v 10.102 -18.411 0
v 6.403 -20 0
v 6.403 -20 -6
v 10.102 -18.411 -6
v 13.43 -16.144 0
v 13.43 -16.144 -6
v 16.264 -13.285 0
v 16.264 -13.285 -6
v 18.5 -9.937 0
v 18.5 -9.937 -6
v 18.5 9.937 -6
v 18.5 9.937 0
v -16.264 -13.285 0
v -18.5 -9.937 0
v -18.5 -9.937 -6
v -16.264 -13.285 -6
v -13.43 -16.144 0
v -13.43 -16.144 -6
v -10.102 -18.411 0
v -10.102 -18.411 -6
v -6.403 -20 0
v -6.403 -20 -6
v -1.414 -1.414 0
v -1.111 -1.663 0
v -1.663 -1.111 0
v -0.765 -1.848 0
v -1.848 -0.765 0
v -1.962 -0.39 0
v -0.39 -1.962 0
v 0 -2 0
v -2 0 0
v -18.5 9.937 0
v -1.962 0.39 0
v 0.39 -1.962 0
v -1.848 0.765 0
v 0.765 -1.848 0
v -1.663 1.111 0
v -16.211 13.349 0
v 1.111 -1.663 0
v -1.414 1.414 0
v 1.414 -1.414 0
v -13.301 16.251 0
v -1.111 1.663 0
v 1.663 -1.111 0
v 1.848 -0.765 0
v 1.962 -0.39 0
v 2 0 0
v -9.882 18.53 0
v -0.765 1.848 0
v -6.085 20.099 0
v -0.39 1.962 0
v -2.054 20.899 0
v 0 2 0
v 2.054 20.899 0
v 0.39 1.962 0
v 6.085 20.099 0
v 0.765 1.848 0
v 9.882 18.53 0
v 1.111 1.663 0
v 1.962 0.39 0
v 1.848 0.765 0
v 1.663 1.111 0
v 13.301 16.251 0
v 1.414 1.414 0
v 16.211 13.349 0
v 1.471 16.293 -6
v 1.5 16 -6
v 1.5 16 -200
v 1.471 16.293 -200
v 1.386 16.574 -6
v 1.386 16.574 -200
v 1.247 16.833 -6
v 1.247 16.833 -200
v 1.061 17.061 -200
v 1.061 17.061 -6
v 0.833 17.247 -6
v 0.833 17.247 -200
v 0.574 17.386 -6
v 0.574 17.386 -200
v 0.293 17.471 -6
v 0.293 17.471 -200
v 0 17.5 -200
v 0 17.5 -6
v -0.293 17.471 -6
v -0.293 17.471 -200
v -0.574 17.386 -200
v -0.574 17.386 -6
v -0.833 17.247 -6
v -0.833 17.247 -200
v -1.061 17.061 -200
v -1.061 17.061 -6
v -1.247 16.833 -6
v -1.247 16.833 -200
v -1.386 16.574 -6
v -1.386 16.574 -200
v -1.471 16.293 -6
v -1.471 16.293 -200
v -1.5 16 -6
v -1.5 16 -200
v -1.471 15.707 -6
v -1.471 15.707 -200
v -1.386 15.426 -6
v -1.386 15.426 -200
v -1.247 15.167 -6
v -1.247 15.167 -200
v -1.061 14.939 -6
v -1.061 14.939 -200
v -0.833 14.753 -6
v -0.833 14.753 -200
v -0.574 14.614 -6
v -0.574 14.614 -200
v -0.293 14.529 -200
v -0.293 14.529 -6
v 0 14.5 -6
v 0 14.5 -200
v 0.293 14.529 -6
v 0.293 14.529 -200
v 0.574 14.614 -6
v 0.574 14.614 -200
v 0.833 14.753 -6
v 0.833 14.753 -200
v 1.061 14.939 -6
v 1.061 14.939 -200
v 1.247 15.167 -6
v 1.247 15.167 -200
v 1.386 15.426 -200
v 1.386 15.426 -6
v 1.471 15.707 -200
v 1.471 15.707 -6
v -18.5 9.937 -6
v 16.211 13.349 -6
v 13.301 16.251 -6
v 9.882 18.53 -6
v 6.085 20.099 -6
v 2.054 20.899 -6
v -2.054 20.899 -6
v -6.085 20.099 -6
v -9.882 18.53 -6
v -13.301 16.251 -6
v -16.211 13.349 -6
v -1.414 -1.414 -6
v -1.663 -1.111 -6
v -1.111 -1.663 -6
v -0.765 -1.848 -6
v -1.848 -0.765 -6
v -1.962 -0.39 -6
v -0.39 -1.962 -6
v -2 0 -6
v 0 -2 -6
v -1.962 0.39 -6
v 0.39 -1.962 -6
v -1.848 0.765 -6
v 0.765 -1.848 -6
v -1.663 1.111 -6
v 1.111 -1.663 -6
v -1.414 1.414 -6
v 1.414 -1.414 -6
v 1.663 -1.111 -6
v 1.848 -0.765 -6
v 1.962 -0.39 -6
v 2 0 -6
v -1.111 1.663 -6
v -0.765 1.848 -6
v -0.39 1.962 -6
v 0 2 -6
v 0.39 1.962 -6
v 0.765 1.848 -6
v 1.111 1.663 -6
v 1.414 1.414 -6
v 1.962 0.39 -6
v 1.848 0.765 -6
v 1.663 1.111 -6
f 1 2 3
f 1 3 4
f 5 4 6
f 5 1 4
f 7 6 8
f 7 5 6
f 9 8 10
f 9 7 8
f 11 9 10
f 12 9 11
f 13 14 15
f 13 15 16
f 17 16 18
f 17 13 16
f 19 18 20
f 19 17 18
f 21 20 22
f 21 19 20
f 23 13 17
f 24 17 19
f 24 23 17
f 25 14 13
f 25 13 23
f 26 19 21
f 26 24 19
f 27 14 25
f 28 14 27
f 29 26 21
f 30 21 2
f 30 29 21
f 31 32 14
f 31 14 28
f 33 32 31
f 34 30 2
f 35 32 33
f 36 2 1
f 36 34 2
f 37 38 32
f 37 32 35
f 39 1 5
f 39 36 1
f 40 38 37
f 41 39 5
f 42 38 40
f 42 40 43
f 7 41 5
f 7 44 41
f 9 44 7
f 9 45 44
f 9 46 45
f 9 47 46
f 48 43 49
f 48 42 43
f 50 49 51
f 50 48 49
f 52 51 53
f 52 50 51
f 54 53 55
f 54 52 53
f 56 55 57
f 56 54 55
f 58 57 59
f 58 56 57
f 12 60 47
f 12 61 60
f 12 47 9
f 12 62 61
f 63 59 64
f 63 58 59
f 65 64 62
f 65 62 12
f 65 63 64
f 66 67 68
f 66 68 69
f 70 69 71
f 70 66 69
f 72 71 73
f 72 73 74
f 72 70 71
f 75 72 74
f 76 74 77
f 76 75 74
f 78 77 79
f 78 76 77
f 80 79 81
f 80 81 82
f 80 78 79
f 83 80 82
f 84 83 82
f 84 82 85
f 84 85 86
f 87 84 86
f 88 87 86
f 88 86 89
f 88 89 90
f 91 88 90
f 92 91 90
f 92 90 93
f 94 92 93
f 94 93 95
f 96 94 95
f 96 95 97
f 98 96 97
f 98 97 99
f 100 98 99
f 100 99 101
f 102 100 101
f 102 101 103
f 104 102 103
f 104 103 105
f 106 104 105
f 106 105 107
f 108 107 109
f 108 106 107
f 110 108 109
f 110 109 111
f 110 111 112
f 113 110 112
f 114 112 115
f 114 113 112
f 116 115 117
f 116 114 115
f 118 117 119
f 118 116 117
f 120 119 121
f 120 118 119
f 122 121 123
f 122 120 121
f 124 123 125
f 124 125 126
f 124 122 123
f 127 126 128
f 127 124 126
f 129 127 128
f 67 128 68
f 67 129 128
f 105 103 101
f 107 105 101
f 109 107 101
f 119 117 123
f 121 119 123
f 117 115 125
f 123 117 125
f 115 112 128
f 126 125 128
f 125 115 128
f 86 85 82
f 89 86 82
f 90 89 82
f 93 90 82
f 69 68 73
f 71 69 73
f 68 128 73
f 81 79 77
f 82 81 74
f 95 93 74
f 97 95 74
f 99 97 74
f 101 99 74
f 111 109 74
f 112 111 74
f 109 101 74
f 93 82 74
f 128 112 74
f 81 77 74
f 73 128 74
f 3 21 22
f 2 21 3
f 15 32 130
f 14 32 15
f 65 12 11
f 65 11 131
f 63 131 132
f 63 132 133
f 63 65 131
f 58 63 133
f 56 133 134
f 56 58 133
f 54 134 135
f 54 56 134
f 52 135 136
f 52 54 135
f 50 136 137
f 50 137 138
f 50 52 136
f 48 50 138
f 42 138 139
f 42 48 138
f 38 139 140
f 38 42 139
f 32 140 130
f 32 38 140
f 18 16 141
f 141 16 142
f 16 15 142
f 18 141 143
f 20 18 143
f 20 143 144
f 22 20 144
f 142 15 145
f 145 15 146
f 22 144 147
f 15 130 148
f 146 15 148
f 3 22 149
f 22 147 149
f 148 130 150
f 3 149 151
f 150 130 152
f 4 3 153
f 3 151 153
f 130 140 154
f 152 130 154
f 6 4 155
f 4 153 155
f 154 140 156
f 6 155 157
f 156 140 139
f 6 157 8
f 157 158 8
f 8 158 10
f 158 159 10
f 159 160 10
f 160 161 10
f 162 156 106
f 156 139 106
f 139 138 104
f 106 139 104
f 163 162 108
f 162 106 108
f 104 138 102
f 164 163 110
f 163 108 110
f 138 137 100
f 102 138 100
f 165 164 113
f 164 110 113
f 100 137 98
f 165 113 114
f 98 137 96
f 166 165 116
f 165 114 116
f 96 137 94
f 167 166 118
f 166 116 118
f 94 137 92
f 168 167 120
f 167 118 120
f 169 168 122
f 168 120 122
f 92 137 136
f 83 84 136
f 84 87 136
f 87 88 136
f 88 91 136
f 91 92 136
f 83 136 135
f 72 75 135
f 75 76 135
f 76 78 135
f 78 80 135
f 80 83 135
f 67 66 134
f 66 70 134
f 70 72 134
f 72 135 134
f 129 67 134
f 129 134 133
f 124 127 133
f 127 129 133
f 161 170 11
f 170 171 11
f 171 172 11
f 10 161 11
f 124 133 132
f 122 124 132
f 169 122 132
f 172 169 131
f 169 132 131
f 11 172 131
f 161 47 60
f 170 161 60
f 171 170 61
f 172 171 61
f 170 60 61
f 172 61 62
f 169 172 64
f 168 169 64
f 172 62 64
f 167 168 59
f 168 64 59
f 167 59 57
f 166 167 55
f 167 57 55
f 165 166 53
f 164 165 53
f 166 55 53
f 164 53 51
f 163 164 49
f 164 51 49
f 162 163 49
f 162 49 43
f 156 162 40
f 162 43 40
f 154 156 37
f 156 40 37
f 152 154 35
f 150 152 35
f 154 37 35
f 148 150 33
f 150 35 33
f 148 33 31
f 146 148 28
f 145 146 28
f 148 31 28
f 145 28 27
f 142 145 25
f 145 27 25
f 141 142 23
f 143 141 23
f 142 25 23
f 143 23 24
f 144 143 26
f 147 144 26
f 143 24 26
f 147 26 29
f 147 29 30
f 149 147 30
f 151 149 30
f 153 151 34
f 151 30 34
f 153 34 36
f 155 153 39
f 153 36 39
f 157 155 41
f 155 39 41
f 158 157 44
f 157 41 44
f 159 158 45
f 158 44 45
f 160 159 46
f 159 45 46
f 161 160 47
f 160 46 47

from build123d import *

# Parameters (mm, degrees)
SKETCH_1_R      = 2
SKETCH_1_R_2    = 1.5
EXTRUDE_1_DEPTH = 6
SKETCH_1_2_R    = 1.5
EXTRUDE_2_DEPTH = 200


with BuildPart() as part:
    # 草图1 → 凸台-拉伸1 (new body)
    with BuildSketch(Plane.XY):
        with BuildLine():
            Line((-6.403124237, -20), (6.403124237, -20))
            ThreePointArc((6.403124237, -20), (13.429663608, -16.144476931), (18.5, -9.937303457))
            Line((18.5, -9.937303457), (18.5, 9.937303457))
            ThreePointArc((18.5, 9.937303457), (0, 21), (-18.5, 9.937303457))
            Line((-18.5, 9.937303457), (-18.5, -9.937303457))
            ThreePointArc((-18.5, -9.937303457), (-13.429663608, -16.144476931), (-6.403124237, -20))
        make_face()
        Circle(SKETCH_1_R, mode=Mode.SUBTRACT)
        with Locations((0, 16)):
            Circle(SKETCH_1_R_2, mode=Mode.SUBTRACT)
    extrude(amount=-EXTRUDE_1_DEPTH)

    # 草图1<2> → 凸台-拉伸2 (add)
    with BuildSketch(Plane.XY):
        with Locations((0, 16)):
            Circle(SKETCH_1_2_R)
    extrude(amount=-EXTRUDE_2_DEPTH)


solid = part.part
